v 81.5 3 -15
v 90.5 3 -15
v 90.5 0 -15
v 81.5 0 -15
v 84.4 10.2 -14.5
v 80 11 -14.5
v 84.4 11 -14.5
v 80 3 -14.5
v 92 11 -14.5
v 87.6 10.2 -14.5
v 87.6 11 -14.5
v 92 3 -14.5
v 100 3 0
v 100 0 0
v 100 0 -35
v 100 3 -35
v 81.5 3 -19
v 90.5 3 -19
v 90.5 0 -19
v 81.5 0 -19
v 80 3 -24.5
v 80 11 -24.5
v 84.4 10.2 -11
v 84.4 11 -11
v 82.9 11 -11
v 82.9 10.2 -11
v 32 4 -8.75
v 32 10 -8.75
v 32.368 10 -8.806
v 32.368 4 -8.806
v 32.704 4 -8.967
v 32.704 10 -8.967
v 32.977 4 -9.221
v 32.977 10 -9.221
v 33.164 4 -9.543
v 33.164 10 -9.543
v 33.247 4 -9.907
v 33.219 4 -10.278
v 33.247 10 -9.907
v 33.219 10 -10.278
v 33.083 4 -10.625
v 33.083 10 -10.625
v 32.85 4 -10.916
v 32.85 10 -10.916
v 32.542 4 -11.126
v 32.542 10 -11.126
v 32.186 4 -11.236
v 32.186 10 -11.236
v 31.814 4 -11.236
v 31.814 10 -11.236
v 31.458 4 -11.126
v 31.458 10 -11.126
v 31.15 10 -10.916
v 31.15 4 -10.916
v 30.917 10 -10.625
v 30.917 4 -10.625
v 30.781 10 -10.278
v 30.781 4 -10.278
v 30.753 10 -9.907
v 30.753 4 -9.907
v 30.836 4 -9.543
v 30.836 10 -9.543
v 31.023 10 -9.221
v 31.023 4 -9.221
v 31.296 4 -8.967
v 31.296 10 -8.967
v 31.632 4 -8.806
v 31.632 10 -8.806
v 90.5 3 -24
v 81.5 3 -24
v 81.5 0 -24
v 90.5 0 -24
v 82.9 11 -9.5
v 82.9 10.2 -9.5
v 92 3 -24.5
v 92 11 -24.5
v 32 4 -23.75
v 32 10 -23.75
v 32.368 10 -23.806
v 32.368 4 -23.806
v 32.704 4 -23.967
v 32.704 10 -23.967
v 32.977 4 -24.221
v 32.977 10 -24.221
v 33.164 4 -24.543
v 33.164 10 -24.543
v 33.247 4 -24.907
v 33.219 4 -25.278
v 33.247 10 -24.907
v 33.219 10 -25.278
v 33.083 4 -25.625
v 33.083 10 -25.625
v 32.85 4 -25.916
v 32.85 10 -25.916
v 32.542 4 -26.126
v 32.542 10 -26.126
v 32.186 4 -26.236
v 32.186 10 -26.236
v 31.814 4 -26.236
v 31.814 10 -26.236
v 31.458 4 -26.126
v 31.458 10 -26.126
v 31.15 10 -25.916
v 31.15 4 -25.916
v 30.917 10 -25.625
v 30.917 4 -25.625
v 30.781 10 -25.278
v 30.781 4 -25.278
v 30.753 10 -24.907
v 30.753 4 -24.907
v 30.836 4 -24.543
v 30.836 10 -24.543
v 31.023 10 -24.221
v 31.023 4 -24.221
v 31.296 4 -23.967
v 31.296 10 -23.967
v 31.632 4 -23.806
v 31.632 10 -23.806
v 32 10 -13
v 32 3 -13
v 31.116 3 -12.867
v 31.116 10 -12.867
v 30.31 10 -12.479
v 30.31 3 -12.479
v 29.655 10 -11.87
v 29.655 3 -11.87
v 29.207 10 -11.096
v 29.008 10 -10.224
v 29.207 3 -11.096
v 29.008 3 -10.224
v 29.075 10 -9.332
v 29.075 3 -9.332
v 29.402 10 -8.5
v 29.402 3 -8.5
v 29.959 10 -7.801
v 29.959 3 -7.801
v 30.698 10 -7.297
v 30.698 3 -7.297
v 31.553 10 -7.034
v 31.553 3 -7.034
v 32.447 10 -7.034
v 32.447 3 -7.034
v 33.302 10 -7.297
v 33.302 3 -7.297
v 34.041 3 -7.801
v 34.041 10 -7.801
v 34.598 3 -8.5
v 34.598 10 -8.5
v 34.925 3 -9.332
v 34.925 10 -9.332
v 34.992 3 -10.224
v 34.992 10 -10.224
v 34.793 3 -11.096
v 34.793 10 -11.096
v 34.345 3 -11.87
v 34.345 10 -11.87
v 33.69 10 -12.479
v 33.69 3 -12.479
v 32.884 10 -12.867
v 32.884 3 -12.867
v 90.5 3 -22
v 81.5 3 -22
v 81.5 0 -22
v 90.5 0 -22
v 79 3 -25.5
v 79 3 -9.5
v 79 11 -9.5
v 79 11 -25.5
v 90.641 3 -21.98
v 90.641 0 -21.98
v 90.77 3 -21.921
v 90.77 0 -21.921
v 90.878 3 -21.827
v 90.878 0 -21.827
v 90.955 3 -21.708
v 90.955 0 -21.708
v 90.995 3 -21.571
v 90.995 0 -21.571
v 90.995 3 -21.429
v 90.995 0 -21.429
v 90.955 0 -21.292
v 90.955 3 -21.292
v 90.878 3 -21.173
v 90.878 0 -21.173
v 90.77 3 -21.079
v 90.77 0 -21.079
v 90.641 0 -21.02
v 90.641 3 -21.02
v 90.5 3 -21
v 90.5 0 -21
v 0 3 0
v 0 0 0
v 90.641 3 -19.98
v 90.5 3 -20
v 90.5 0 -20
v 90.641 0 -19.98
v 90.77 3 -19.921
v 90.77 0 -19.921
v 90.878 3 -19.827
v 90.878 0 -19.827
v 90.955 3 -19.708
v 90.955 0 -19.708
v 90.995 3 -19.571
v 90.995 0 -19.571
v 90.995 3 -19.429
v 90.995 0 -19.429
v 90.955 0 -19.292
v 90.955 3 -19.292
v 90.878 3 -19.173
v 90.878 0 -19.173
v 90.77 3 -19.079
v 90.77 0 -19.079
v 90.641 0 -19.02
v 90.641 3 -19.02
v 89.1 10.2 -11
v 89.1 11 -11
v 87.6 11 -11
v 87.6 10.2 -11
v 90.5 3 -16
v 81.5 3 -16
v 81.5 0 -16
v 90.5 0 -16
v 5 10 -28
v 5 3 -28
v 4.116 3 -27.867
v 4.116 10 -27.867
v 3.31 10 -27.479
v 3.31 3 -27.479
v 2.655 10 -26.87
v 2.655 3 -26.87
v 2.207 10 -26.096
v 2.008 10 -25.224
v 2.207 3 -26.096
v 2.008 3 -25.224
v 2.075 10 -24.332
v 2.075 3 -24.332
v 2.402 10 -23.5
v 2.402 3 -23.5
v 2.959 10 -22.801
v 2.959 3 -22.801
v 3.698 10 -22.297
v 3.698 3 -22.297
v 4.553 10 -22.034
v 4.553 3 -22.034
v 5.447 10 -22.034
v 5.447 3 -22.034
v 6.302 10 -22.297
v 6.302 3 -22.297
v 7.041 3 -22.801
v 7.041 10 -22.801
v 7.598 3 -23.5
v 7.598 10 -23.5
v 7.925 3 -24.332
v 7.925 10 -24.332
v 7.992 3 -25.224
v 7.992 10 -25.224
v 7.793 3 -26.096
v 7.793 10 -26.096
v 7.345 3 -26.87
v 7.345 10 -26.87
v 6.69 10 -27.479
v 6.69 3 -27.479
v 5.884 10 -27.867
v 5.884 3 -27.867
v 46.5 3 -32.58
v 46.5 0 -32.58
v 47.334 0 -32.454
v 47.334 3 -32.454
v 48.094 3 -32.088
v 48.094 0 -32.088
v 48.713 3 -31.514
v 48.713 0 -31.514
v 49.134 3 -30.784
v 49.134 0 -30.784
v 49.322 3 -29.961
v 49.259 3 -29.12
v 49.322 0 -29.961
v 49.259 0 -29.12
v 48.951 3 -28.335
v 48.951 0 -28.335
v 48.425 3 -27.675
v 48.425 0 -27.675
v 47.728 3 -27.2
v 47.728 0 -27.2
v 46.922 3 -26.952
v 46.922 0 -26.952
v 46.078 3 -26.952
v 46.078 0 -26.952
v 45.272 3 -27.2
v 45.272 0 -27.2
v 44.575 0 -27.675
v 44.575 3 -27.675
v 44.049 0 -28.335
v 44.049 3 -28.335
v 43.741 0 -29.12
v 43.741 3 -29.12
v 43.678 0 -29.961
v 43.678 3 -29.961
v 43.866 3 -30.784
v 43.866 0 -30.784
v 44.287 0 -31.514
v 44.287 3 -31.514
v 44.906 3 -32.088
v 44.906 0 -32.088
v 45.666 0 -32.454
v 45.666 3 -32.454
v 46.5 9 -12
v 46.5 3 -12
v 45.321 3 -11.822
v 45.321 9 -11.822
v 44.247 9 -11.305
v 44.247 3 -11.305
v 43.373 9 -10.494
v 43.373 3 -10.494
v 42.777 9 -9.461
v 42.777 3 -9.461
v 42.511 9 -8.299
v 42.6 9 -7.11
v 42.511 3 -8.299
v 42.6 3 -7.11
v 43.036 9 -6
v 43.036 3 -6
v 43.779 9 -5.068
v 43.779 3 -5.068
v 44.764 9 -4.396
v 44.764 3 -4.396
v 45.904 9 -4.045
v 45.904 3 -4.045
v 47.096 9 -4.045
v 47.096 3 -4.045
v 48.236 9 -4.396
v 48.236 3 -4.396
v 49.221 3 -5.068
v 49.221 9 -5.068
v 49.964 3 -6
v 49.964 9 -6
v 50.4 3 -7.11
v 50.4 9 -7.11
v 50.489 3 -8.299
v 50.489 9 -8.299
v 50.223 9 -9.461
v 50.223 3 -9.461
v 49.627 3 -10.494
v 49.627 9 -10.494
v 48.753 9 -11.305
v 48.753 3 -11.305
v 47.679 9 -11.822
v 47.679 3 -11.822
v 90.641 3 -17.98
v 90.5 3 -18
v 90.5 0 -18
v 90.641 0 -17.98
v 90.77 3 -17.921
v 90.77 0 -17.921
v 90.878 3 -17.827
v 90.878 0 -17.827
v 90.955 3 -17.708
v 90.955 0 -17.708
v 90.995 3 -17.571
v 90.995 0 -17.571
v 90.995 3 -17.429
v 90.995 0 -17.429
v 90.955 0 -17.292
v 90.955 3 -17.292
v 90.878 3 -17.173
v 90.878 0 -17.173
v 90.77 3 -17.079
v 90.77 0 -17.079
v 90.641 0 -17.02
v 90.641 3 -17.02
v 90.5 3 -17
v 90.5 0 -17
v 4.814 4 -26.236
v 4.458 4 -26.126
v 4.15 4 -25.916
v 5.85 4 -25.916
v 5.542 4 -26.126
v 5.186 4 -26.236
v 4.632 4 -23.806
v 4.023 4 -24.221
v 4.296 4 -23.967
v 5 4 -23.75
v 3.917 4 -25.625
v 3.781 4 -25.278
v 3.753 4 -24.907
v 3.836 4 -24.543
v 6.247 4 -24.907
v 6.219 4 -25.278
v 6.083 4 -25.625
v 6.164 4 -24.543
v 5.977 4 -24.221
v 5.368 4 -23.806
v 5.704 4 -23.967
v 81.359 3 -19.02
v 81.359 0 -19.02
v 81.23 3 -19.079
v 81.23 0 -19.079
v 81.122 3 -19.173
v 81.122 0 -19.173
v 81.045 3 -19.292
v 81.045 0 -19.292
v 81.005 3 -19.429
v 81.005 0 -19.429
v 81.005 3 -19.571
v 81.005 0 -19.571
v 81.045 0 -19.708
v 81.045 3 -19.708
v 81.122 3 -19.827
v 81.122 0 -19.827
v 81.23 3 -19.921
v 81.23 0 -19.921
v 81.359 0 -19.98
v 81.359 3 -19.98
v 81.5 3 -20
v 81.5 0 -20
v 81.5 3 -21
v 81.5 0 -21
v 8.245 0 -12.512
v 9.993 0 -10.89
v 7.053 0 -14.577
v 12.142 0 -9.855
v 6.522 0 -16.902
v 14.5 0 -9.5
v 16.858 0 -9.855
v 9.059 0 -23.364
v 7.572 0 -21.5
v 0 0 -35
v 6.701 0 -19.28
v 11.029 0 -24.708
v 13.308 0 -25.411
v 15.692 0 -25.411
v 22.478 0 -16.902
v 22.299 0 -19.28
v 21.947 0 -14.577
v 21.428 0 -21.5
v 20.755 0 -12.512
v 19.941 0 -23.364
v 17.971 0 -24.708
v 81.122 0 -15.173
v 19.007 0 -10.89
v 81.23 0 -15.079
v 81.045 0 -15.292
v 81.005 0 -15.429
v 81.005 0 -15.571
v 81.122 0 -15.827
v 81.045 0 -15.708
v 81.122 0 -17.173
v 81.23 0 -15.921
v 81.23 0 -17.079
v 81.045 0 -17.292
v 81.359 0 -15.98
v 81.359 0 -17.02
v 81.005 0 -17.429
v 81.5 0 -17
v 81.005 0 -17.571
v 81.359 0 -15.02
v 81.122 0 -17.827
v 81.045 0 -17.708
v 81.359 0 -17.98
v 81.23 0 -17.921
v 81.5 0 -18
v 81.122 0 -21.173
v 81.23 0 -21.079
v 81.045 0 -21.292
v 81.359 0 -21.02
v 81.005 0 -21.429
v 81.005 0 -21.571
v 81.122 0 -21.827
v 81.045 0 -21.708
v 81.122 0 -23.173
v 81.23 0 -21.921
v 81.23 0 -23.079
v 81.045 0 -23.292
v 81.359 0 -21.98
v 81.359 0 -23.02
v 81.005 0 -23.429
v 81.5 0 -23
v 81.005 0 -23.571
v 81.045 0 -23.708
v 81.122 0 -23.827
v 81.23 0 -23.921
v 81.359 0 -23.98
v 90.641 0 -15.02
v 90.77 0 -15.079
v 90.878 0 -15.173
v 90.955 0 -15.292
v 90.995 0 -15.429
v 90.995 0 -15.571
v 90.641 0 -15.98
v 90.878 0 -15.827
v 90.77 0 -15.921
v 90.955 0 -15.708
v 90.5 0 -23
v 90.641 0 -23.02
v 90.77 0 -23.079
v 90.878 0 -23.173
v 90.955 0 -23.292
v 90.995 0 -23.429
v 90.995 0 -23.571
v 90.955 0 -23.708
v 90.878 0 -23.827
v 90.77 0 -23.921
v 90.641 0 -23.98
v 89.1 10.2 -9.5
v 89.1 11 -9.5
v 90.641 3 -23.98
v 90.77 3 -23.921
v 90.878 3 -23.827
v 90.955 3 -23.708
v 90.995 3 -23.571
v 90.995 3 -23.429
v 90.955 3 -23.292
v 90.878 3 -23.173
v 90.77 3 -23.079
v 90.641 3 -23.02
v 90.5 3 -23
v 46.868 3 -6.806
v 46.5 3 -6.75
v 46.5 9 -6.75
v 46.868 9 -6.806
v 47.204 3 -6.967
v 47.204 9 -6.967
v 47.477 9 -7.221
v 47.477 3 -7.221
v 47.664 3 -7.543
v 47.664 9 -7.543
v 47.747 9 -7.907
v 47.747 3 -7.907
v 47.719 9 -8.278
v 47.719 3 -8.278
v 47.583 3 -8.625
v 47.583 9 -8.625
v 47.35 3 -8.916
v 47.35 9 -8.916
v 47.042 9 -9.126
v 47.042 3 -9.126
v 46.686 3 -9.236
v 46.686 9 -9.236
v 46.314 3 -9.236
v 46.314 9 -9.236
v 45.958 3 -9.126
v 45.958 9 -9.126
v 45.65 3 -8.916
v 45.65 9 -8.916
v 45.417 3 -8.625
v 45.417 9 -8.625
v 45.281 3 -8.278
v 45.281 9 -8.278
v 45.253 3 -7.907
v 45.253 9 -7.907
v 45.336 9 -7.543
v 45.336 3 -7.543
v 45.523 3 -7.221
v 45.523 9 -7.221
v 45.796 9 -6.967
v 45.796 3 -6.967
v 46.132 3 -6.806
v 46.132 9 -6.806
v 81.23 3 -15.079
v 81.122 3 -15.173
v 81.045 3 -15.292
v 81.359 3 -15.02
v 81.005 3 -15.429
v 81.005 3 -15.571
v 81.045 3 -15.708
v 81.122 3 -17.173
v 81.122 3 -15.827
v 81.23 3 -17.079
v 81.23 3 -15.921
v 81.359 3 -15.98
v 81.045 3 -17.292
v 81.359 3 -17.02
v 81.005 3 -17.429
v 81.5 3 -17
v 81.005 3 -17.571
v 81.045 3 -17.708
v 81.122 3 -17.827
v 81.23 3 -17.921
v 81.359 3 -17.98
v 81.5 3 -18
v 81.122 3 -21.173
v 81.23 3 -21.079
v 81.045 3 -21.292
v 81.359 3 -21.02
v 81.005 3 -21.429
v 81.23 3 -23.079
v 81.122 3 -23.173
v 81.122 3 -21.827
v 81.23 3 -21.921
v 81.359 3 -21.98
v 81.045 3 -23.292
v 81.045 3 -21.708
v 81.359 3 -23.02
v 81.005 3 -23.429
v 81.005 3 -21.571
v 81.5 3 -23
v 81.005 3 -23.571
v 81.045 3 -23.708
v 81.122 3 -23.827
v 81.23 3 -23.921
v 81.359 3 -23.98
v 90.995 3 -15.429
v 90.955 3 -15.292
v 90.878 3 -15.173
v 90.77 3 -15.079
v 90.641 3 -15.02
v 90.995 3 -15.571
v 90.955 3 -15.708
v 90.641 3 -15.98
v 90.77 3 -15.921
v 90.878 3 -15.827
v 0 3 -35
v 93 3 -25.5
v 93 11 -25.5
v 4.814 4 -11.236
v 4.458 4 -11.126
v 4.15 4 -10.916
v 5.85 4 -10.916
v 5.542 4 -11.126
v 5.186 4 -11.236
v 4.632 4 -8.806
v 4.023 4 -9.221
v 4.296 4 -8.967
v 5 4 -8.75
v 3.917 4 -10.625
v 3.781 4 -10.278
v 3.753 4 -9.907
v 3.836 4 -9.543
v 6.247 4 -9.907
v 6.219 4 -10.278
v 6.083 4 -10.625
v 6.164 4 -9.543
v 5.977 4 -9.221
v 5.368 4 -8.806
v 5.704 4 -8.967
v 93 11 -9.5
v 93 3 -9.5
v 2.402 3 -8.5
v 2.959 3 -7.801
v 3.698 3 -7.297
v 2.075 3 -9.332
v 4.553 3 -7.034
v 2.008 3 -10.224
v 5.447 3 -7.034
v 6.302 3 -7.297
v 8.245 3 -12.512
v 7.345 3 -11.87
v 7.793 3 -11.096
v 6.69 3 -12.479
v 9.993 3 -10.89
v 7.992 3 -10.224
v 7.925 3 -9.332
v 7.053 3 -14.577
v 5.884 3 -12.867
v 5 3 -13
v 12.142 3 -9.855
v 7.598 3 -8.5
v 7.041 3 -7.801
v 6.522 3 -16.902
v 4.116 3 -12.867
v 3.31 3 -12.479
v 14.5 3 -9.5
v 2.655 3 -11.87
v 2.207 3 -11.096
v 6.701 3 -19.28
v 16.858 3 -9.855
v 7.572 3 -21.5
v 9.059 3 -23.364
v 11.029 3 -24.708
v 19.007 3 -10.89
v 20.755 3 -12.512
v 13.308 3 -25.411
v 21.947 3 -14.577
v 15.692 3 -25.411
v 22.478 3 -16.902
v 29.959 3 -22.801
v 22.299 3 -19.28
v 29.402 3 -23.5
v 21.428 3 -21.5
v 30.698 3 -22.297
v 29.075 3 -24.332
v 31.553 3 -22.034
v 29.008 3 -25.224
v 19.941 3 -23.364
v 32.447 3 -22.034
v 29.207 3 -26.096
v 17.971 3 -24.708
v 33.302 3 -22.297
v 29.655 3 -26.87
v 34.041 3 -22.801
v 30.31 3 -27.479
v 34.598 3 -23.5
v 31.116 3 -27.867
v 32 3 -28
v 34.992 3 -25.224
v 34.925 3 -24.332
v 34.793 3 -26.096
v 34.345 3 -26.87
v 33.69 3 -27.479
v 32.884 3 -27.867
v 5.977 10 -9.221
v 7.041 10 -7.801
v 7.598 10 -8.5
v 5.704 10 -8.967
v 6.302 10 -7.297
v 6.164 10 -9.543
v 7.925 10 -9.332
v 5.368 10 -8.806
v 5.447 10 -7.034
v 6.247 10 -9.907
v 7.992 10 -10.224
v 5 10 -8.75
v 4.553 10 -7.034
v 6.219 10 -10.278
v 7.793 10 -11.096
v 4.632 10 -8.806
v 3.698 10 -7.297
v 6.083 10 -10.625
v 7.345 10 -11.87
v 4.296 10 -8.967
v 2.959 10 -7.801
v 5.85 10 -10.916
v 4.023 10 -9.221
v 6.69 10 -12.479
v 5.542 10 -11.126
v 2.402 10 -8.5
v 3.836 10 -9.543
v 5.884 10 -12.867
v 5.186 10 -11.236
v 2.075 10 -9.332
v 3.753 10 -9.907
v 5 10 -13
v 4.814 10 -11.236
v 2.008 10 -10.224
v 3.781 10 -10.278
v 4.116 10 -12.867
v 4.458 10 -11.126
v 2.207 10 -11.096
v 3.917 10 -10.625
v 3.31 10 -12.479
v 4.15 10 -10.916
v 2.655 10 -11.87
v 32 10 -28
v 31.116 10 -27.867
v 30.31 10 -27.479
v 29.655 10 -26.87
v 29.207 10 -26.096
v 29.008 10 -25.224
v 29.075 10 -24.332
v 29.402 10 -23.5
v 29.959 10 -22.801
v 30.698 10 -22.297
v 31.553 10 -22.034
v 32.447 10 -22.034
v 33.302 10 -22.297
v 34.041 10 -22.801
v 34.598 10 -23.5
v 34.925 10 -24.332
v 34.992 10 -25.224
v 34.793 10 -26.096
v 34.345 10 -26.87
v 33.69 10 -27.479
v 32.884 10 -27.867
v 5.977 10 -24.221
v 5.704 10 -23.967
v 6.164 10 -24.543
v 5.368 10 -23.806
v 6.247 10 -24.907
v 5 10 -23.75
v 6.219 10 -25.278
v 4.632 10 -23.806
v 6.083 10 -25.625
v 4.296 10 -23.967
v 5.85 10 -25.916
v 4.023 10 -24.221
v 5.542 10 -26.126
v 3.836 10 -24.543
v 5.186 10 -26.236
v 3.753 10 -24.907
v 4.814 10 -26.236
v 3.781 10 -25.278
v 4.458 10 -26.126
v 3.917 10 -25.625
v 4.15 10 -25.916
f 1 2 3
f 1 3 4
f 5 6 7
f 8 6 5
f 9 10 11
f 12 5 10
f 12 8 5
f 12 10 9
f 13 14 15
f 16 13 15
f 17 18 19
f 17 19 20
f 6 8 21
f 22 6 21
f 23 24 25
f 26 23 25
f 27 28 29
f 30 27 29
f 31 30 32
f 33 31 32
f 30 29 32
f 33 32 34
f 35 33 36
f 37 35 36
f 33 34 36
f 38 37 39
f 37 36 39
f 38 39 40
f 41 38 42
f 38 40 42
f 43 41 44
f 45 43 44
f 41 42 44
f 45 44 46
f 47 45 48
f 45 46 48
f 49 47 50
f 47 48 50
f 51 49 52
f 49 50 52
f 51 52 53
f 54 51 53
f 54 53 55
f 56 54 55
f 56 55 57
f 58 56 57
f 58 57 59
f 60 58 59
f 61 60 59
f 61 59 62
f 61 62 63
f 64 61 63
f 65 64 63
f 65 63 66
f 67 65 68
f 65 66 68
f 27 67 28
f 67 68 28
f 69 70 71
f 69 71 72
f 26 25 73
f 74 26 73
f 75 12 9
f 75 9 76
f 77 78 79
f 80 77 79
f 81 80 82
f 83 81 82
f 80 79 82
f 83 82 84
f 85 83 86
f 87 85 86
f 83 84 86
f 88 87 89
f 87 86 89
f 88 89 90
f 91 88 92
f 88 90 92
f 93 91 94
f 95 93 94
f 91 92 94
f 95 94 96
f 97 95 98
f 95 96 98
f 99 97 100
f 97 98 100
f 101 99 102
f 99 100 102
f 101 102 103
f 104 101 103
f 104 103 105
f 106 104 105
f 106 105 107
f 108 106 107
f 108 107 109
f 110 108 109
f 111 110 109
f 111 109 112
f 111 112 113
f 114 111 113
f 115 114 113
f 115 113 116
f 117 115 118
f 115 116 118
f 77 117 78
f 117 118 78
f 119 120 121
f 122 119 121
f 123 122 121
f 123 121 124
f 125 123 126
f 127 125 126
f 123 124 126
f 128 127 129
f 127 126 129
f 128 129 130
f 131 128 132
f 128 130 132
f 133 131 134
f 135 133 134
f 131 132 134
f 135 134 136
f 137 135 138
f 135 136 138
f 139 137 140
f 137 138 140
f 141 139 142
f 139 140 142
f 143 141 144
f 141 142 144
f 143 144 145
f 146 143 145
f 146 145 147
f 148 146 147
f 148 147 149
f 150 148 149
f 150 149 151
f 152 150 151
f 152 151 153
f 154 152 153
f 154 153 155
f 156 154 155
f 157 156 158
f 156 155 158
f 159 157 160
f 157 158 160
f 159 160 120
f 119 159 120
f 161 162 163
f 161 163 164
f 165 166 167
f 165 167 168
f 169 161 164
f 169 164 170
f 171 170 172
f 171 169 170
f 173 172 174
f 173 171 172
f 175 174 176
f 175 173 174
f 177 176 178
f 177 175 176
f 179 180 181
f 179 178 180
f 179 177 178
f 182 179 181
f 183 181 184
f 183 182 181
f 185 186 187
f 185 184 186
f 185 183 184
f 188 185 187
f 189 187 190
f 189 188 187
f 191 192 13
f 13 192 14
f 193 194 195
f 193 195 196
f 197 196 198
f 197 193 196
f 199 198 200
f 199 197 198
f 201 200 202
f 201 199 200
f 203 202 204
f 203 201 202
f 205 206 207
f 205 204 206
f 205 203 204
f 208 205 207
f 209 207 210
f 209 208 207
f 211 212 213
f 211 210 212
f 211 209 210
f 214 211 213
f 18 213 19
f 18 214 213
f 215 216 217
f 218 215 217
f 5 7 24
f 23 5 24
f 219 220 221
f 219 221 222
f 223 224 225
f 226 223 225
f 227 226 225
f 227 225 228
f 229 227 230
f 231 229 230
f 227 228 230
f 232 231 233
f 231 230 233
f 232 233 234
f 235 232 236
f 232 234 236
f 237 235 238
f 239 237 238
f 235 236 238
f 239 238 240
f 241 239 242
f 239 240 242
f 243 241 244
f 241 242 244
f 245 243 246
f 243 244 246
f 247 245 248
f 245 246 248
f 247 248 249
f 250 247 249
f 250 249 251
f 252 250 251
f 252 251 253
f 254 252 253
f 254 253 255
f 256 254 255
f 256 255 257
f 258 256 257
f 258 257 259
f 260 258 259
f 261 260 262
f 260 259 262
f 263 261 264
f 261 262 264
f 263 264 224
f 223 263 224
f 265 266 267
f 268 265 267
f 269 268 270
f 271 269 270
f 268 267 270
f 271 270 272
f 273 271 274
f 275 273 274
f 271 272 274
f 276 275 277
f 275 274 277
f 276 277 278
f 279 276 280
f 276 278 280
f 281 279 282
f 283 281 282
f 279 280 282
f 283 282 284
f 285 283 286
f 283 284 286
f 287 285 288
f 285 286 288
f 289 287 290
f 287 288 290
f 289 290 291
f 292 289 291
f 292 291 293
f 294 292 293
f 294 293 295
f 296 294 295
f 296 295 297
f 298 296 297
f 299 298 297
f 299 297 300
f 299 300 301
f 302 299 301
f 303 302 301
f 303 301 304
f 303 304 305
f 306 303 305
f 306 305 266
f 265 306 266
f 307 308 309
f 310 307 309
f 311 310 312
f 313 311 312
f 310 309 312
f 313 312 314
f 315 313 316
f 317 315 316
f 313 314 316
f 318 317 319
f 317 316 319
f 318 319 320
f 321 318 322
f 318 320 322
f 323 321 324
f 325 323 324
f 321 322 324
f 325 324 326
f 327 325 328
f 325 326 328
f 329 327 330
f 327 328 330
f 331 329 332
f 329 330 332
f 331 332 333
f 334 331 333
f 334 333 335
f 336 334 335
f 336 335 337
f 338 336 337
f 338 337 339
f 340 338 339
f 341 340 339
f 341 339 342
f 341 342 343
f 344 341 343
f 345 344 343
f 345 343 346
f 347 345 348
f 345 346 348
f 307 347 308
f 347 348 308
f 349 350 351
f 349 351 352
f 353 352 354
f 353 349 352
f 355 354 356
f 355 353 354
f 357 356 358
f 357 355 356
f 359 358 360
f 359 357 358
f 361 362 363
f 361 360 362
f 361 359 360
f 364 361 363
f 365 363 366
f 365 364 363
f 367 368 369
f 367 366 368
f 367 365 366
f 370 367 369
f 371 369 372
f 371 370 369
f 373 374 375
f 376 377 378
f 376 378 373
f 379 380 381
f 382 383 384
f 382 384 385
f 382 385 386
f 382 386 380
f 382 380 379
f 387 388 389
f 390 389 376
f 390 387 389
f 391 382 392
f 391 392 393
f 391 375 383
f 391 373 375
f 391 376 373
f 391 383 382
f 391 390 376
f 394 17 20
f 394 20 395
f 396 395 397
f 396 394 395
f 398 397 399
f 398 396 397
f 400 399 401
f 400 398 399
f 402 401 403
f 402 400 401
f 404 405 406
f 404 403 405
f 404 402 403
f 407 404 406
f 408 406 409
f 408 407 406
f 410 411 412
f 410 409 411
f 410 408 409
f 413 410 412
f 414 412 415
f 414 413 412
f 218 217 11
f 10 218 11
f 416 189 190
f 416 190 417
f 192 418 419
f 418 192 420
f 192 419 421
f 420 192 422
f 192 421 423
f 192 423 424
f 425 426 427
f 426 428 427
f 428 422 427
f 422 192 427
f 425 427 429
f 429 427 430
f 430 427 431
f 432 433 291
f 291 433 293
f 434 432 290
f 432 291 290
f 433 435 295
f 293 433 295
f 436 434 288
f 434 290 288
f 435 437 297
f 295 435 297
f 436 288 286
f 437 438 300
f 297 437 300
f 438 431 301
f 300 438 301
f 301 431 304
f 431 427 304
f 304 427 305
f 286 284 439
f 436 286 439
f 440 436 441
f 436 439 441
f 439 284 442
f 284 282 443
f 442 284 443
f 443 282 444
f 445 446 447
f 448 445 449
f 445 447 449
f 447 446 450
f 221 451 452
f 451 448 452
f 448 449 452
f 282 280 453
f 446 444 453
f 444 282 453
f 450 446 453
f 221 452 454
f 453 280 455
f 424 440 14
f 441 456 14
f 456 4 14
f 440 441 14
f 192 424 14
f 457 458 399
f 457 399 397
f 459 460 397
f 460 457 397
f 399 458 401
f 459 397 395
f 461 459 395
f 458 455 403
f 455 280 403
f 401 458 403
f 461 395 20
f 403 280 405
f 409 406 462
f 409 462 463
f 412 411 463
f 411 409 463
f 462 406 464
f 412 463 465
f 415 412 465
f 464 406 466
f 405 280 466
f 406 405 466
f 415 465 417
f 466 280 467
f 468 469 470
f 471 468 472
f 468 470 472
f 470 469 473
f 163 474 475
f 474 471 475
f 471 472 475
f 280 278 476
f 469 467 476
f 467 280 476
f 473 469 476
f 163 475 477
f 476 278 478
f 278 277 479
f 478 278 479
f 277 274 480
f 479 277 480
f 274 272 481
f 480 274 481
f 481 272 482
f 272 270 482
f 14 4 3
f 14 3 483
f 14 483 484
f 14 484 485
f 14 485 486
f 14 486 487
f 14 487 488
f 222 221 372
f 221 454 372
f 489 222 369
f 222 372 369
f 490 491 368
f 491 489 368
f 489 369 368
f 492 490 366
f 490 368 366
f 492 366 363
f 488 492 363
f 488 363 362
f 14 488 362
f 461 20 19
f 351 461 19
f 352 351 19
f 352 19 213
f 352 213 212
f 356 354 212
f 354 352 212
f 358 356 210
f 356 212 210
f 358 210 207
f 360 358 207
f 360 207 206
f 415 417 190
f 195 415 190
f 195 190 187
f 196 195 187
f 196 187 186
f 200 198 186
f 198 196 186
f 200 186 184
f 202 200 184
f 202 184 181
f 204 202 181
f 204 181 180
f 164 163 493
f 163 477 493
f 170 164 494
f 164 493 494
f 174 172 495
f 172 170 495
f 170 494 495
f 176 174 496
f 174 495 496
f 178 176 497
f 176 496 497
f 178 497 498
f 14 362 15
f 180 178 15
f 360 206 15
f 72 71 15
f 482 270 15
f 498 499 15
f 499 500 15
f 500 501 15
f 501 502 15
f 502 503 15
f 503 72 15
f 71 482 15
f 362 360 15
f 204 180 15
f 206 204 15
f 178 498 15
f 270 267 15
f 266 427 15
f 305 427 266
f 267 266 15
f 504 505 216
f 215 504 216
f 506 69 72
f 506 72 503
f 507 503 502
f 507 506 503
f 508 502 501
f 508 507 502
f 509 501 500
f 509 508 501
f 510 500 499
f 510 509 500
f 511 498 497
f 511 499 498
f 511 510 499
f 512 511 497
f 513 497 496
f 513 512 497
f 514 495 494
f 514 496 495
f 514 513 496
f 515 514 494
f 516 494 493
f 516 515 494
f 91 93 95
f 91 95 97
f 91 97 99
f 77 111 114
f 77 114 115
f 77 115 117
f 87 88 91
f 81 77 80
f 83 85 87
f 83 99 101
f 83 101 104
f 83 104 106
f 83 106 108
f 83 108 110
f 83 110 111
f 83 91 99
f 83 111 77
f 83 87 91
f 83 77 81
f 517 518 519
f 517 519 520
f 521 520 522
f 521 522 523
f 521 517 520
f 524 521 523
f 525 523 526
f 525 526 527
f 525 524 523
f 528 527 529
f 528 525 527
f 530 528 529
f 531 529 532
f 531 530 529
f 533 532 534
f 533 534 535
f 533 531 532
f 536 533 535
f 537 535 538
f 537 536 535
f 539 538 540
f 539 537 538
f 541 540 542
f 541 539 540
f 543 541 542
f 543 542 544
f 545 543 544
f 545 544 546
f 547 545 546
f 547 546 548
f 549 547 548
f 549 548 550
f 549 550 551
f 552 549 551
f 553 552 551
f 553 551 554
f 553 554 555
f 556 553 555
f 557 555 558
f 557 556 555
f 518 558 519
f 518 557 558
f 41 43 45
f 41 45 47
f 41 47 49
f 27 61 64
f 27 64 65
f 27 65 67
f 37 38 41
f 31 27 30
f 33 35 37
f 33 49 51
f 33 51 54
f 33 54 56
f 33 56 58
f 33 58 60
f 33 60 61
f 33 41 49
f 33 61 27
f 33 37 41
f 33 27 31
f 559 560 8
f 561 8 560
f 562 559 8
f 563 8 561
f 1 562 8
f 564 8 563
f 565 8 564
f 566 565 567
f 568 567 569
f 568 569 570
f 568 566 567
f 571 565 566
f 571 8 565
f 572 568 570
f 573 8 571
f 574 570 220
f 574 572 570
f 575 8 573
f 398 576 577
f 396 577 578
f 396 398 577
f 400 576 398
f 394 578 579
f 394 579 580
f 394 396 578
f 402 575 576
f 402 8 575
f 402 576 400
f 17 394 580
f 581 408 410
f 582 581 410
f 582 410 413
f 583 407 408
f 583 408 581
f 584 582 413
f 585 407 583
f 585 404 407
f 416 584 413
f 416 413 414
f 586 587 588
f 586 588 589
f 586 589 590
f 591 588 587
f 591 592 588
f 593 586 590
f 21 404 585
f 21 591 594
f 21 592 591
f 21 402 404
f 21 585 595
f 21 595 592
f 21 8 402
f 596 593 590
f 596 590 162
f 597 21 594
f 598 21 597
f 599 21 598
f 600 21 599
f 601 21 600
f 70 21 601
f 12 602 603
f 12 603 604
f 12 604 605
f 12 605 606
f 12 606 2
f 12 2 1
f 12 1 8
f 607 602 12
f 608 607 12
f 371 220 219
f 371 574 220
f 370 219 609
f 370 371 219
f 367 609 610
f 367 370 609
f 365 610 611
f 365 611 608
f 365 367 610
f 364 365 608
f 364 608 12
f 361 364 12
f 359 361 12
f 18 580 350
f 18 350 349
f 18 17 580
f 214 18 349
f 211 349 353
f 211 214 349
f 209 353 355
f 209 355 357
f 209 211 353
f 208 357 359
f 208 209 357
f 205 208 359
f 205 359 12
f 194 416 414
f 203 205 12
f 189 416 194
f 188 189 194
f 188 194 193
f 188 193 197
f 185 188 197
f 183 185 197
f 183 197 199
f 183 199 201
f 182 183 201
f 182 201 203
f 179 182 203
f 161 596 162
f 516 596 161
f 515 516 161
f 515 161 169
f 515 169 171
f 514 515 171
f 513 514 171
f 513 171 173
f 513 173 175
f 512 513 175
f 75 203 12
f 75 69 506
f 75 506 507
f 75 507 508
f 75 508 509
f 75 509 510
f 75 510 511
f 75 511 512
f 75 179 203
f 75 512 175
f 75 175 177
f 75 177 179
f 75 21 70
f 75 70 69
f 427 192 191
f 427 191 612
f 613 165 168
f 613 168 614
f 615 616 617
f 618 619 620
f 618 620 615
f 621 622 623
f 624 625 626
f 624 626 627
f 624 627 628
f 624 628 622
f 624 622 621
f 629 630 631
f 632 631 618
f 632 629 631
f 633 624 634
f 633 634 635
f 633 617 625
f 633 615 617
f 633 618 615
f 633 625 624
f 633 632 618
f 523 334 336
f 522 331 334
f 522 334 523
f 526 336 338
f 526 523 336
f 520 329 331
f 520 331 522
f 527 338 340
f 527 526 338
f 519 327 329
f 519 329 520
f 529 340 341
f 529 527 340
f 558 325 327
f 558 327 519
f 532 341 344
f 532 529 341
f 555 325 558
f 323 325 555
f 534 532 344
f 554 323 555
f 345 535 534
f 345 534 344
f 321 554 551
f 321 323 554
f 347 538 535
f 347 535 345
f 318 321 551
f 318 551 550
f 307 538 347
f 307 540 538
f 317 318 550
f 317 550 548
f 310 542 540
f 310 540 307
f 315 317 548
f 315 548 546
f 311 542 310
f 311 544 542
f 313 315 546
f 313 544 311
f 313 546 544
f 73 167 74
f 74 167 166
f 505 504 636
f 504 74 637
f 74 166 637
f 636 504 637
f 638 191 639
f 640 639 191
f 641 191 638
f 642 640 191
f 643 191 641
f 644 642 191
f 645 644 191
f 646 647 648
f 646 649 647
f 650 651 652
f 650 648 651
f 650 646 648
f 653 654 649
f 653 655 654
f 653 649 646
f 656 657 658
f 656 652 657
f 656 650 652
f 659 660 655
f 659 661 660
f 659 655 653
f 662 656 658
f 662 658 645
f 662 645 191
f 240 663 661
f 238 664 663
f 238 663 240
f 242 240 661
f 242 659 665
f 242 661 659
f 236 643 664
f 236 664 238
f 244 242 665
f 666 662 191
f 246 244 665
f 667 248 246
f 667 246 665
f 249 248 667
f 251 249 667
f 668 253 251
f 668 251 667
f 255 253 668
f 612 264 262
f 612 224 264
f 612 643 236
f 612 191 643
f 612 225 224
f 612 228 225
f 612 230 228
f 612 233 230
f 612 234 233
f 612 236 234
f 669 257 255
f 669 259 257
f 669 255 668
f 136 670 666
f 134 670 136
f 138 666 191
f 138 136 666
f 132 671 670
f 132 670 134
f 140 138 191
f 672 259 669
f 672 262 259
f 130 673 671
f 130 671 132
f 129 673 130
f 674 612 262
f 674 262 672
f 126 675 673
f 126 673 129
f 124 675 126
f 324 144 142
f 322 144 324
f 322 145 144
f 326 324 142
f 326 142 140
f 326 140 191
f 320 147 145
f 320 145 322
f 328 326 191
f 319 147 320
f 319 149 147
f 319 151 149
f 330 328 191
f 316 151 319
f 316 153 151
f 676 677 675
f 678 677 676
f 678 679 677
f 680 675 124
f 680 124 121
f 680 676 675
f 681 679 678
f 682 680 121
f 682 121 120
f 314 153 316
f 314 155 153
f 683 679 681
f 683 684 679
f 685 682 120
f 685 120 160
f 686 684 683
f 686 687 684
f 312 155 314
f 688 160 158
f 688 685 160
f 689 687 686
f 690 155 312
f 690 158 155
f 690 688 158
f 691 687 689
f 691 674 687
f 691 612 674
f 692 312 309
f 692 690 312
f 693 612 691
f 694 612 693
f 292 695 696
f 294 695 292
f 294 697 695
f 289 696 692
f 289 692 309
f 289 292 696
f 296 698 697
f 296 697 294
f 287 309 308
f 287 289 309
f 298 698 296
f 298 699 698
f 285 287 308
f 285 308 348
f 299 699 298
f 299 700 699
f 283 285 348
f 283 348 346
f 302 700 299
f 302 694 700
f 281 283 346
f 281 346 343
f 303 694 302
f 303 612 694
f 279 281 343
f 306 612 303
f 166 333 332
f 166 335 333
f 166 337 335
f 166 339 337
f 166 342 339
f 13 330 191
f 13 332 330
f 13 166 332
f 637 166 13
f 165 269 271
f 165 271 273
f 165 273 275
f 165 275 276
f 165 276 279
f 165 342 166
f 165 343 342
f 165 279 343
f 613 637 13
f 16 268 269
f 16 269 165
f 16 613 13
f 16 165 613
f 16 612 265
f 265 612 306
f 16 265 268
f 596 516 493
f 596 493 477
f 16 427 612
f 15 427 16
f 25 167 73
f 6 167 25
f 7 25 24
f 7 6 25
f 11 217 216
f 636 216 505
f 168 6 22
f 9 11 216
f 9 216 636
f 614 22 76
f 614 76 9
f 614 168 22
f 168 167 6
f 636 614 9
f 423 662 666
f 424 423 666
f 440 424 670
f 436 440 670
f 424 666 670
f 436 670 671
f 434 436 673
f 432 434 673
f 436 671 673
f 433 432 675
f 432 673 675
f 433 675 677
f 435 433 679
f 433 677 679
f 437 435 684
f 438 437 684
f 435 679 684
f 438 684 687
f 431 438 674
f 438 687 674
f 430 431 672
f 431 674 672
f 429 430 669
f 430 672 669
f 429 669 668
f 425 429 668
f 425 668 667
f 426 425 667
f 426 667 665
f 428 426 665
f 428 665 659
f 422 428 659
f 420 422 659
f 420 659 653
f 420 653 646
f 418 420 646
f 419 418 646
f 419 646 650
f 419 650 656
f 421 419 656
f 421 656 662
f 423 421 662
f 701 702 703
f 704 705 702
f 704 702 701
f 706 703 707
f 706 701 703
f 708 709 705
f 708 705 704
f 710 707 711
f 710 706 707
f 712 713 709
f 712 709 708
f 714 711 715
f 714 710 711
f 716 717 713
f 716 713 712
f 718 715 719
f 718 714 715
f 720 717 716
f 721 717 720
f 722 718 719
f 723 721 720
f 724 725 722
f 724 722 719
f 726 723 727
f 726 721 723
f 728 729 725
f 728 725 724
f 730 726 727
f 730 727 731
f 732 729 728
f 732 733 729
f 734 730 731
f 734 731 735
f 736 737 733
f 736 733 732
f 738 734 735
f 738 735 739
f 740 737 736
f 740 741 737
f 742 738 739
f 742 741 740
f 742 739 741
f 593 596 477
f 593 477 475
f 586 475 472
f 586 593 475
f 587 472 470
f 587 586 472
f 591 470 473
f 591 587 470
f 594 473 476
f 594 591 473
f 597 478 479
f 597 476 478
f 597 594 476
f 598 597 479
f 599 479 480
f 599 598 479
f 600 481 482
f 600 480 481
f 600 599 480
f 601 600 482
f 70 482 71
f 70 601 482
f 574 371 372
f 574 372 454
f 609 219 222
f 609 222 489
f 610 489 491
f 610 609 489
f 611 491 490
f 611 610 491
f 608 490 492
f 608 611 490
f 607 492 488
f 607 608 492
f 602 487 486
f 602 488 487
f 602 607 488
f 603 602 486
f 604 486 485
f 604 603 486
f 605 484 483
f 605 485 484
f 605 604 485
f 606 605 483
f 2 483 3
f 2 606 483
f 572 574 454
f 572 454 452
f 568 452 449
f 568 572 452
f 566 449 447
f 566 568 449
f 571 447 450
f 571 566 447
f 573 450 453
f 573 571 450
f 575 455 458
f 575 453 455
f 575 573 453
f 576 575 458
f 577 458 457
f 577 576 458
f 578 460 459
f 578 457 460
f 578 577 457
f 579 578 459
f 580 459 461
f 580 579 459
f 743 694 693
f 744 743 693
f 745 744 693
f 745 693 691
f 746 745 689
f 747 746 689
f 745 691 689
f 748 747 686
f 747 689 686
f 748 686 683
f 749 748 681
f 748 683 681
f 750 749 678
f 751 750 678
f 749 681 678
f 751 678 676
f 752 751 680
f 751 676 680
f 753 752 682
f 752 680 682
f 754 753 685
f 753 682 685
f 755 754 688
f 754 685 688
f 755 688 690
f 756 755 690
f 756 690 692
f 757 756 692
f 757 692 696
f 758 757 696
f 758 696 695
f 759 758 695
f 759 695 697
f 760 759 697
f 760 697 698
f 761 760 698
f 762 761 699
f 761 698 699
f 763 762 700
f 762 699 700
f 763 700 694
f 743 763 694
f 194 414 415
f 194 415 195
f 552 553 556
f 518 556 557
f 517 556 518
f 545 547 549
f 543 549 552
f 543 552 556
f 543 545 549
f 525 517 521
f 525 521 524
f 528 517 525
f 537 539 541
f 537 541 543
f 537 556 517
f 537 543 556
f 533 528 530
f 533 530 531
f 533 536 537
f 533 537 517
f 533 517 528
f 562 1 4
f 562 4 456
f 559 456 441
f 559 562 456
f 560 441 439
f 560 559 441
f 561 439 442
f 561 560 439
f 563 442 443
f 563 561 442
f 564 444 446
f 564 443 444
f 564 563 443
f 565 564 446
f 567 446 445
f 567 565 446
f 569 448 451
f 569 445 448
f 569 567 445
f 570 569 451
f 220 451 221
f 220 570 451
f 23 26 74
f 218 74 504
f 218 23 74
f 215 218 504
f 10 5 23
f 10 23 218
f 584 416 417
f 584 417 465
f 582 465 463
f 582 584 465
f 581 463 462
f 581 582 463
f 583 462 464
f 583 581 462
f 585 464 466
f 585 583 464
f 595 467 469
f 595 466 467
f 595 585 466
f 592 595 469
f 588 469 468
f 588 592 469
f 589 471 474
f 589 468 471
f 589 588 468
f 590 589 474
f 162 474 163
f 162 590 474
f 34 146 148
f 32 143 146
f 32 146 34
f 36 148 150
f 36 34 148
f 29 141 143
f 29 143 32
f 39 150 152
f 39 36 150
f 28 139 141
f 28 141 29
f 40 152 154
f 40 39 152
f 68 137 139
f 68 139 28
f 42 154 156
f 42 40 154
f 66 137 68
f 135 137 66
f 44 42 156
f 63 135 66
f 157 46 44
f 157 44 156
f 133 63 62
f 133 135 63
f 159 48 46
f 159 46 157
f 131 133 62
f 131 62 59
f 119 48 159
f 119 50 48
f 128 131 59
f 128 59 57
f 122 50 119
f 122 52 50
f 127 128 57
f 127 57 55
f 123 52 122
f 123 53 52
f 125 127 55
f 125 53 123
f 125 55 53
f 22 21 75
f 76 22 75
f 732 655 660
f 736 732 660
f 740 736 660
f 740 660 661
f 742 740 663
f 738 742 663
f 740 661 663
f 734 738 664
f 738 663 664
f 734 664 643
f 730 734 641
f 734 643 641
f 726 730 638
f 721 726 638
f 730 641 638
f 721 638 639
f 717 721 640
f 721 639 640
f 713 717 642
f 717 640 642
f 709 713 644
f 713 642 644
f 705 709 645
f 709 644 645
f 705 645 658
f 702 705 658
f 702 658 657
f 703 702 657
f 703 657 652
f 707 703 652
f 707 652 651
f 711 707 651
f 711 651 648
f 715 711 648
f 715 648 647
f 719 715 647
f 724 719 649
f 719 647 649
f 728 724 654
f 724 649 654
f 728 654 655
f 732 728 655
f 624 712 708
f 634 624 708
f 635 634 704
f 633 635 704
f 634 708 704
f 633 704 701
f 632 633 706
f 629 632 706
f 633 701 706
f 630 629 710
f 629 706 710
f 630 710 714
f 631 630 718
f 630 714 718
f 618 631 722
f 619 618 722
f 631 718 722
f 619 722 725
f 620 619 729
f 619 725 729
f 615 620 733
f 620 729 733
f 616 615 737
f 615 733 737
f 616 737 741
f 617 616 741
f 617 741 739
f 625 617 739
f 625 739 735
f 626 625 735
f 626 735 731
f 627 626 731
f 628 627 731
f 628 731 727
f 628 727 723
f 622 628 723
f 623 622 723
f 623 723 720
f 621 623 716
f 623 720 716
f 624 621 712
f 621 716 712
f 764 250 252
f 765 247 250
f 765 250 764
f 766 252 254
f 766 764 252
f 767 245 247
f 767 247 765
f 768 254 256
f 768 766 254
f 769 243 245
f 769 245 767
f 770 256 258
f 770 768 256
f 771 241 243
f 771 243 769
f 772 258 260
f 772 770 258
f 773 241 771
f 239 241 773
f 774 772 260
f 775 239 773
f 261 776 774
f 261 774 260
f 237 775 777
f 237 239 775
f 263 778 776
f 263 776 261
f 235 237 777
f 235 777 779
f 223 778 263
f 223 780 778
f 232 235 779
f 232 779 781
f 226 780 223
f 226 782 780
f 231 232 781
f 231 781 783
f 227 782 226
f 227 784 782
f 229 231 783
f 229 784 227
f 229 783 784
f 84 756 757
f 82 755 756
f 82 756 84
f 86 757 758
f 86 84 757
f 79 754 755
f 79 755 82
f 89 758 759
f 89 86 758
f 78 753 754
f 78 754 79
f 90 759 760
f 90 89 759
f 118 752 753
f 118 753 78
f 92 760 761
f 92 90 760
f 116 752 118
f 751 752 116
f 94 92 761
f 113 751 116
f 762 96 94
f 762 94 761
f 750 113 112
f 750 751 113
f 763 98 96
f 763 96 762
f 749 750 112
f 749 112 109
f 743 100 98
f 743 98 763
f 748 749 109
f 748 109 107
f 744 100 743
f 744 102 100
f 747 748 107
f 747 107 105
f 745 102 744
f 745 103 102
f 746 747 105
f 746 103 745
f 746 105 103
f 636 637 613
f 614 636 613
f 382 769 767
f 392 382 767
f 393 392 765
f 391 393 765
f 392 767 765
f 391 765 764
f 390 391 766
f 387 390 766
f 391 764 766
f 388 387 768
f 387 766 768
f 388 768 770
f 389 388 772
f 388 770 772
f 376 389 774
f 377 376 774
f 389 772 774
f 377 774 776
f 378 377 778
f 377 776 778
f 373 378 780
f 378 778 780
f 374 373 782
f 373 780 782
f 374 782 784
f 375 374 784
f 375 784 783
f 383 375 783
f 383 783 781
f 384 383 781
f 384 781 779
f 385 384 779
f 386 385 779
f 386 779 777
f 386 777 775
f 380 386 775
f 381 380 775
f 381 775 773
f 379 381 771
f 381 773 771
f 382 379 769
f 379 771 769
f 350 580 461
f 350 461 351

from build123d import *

# Parameters (mm, degrees)
SKETCH1_W           = 100
SKETCH1_H           = 35
BOSS_EXTRUDE1_DEPTH = 3
SKETCH2_R           = 3
BOSS_EXTRUDE2_DEPTH = 7
CUT_EXTRUDE2_REACH  = 108.179
SKETCH3_R           = 8
SKETCH4_R           = 1.25
CUT_EXTRUDE3_DEPTH  = 6
SKETCH5_R           = 4
SKETCH5_R_2         = 1.25
BOSS_EXTRUDE3_DEPTH = 6
CUT_EXTRUDE4_REACH  = 108.419
SKETCH6_R           = 2.83
SKETCH8_W           = 14
SKETCH8_H           = 16
SKETCH8_W_2         = 12
SKETCH8_H_2         = 10
BOSS_EXTRUDE4_DEPTH = 8
CUT_EXTRUDE5_DEPTH  = 0.8
CUT_EXTRUDE6_REACH  = 108.25


with BuildPart() as part:
    # Sketch1 → Boss-Extrude1 (new body)
    with BuildSketch(Plane(origin=(0, 0, 0), x_dir=(1, 0, 0), z_dir=(0, 1, 0))):
        with Locations((50, 17.5)):
            Rectangle(SKETCH1_W, SKETCH1_H)
    extrude(amount=BOSS_EXTRUDE1_DEPTH)

    # Sketch2 → Boss-Extrude2 (add)
    with BuildSketch(Plane(origin=(0, 3, 0), x_dir=(1, 0, 0), z_dir=(0, 1, 0))):
        with Locations(Location((5, 25, 0), (0, 0, 90))):
            Circle(SKETCH2_R)
        with Locations(Location((5, 10, 0), (0, 0, 90))):
            Circle(SKETCH2_R)
        with Locations(Location((32, 10, 0), (0, 0, 90))):
            Circle(SKETCH2_R)
        with Locations(Location((32, 25, 0), (0, 0, 90))):
            Circle(SKETCH2_R)
    extrude(amount=BOSS_EXTRUDE2_DEPTH)

    # Sketch3 → Cut-Extrude2 (cut, up to next)
    with BuildSketch(Plane(origin=(0, 3, 0), x_dir=(1, 0, 0), z_dir=(0, 1, 0)), mode=Mode.PRIVATE) as cut_extrude2_sk1:
        with Locations(Location((14.5, 17.5, 0), (0, 0, 270))):
            Circle(SKETCH3_R)
    cut_extrude2_tool1 = extrude(cut_extrude2_sk1.sketch, amount=-CUT_EXTRUDE2_REACH, mode=Mode.PRIVATE) & part.part
    add(cut_extrude2_tool1.solids().sort_by_distance((14.5, 3, -17.5))[0], mode=Mode.SUBTRACT)

    # Sketch4 → Cut-Extrude3 (cut)
    with BuildSketch(Plane(origin=(0, 10, 0), x_dir=(1, 0, 0), z_dir=(0, 1, 0))):
        with Locations(Location((32, 25, 0), (0, 0, 270))):
            Circle(SKETCH4_R)
        with Locations(Location((32, 10, 0), (0, 0, 270))):
            Circle(SKETCH4_R)
        with Locations(Location((5, 10, 0), (0, 0, 270))):
            Circle(SKETCH4_R)
        with Locations(Location((5, 25, 0), (0, 0, 270))):
            Circle(SKETCH4_R)
    extrude(amount=-CUT_EXTRUDE3_DEPTH, mode=Mode.SUBTRACT)

    # Sketch5 → Boss-Extrude3 (add)
    with BuildSketch(Plane(origin=(0, 3, 0), x_dir=(1, 0, 0), z_dir=(0, 1, 0))):
        with Locations(Location((46.5, 8, 0), (0, 0, 90))):
            Circle(SKETCH5_R)
        with Locations(Location((46.5, 8, 0), (0, 0, 270))):
            Circle(SKETCH5_R_2, mode=Mode.SUBTRACT)
    extrude(amount=BOSS_EXTRUDE3_DEPTH)

    # Sketch6 → Cut-Extrude4 (cut, up to next)
    with BuildSketch(Plane.XZ, mode=Mode.PRIVATE) as cut_extrude4_sk1:
        with Locations(Location((46.5, -29.75, 0), (0, 0, 270))):
            Circle(SKETCH6_R)
    cut_extrude4_tool1 = extrude(cut_extrude4_sk1.sketch, amount=-CUT_EXTRUDE4_REACH, mode=Mode.PRIVATE) & part.part
    add(cut_extrude4_tool1.solids().sort_by_distance((46.5, 0, -29.75))[0], mode=Mode.SUBTRACT)

    # Sketch8 → Boss-Extrude4 (add)
    with BuildSketch(Plane(origin=(0, 3, 0), x_dir=(1, 0, 0), z_dir=(0, 1, 0))):
        with Locations((86, 17.5)):
            Rectangle(SKETCH8_W, SKETCH8_H)
        with Locations((86, 19.5)):
            Rectangle(SKETCH8_W_2, SKETCH8_H_2, mode=Mode.SUBTRACT)
    extrude(amount=BOSS_EXTRUDE4_DEPTH)

    # Sketch9 → Cut-Extrude5 (cut)
    with BuildSketch(Plane(origin=(0, 11, 0), x_dir=(1, 0, 0), z_dir=(0, 1, 0))):
        Polygon((84.4, 14.5), (84.4, 11), (82.9, 11), (82.9, 9.5), (89.1, 9.5), (89.1, 11), (87.6, 11), (87.6, 14.5), align=None)
    extrude(amount=-CUT_EXTRUDE5_DEPTH, mode=Mode.SUBTRACT)

    # Sketch10 → Cut-Extrude6 (cut, up to next)
    with BuildSketch(Plane(origin=(0, 3, 0), x_dir=(1, 0, 0), z_dir=(0, 1, 0)), mode=Mode.PRIVATE) as cut_extrude6_sk1:
        with BuildLine():
            Line((81.5, 24), (90.5, 24))
            ThreePointArc((90.5, 24), (91, 23.5), (90.5, 23))
            Line((90.5, 23), (81.5, 23))
            ThreePointArc((81.5, 23), (81, 23.5), (81.5, 24))
        make_face()
    cut_extrude6_tool1 = extrude(cut_extrude6_sk1.sketch, amount=-CUT_EXTRUDE6_REACH, mode=Mode.PRIVATE) & part.part
    # Sketch10 → Cut-Extrude6 (cut, up to next)
    with BuildSketch(Plane(origin=(0, 3, 0), x_dir=(1, 0, 0), z_dir=(0, 1, 0)), mode=Mode.PRIVATE) as cut_extrude6_sk2:
        with BuildLine():
            Line((81.5, 22), (90.5, 22))
            ThreePointArc((90.5, 22), (91, 21.5), (90.5, 21))
            Line((90.5, 21), (81.5, 21))
            ThreePointArc((81.5, 21), (81, 21.5), (81.5, 22))
        make_face()
    cut_extrude6_tool2 = extrude(cut_extrude6_sk2.sketch, amount=-CUT_EXTRUDE6_REACH, mode=Mode.PRIVATE) & part.part
    # Sketch10 → Cut-Extrude6 (cut, up to next)
    with BuildSketch(Plane(origin=(0, 3, 0), x_dir=(1, 0, 0), z_dir=(0, 1, 0)), mode=Mode.PRIVATE) as cut_extrude6_sk3:
        with BuildLine():
            Line((81.5, 20), (90.5, 20))
            ThreePointArc((90.5, 20), (91, 19.5), (90.5, 19))
            Line((90.5, 19), (81.5, 19))
            ThreePointArc((81.5, 19), (81, 19.5), (81.5, 20))
        make_face()
    cut_extrude6_tool3 = extrude(cut_extrude6_sk3.sketch, amount=-CUT_EXTRUDE6_REACH, mode=Mode.PRIVATE) & part.part
    # Sketch10 → Cut-Extrude6 (cut, up to next)
    with BuildSketch(Plane(origin=(0, 3, 0), x_dir=(1, 0, 0), z_dir=(0, 1, 0)), mode=Mode.PRIVATE) as cut_extrude6_sk4:
        with BuildLine():
            Line((81.5, 18), (90.5, 18))
            ThreePointArc((90.5, 18), (91, 17.5), (90.5, 17))
            Line((90.5, 17), (81.5, 17))
            ThreePointArc((81.5, 17), (81, 17.5), (81.5, 18))
        make_face()
    cut_extrude6_tool4 = extrude(cut_extrude6_sk4.sketch, amount=-CUT_EXTRUDE6_REACH, mode=Mode.PRIVATE) & part.part
    # Sketch10 → Cut-Extrude6 (cut, up to next)
    with BuildSketch(Plane(origin=(0, 3, 0), x_dir=(1, 0, 0), z_dir=(0, 1, 0)), mode=Mode.PRIVATE) as cut_extrude6_sk5:
        with BuildLine():
            Line((81.5, 16), (90.5, 16))
            ThreePointArc((90.5, 16), (91, 15.5), (90.5, 15))
            Line((90.5, 15), (81.5, 15))
            ThreePointArc((81.5, 15), (81, 15.5), (81.5, 16))
        make_face()
    cut_extrude6_tool5 = extrude(cut_extrude6_sk5.sketch, amount=-CUT_EXTRUDE6_REACH, mode=Mode.PRIVATE) & part.part
    add(cut_extrude6_tool1.solids().sort_by_distance((86, 3, -23.5))[0], mode=Mode.SUBTRACT)
    add(cut_extrude6_tool2.solids().sort_by_distance((86, 3, -21.5))[0], mode=Mode.SUBTRACT)
    add(cut_extrude6_tool3.solids().sort_by_distance((86, 3, -19.5))[0], mode=Mode.SUBTRACT)
    add(cut_extrude6_tool4.solids().sort_by_distance((86, 3, -17.5))[0], mode=Mode.SUBTRACT)
    add(cut_extrude6_tool5.solids().sort_by_distance((86, 3, -15.5))[0], mode=Mode.SUBTRACT)


solid = part.part
